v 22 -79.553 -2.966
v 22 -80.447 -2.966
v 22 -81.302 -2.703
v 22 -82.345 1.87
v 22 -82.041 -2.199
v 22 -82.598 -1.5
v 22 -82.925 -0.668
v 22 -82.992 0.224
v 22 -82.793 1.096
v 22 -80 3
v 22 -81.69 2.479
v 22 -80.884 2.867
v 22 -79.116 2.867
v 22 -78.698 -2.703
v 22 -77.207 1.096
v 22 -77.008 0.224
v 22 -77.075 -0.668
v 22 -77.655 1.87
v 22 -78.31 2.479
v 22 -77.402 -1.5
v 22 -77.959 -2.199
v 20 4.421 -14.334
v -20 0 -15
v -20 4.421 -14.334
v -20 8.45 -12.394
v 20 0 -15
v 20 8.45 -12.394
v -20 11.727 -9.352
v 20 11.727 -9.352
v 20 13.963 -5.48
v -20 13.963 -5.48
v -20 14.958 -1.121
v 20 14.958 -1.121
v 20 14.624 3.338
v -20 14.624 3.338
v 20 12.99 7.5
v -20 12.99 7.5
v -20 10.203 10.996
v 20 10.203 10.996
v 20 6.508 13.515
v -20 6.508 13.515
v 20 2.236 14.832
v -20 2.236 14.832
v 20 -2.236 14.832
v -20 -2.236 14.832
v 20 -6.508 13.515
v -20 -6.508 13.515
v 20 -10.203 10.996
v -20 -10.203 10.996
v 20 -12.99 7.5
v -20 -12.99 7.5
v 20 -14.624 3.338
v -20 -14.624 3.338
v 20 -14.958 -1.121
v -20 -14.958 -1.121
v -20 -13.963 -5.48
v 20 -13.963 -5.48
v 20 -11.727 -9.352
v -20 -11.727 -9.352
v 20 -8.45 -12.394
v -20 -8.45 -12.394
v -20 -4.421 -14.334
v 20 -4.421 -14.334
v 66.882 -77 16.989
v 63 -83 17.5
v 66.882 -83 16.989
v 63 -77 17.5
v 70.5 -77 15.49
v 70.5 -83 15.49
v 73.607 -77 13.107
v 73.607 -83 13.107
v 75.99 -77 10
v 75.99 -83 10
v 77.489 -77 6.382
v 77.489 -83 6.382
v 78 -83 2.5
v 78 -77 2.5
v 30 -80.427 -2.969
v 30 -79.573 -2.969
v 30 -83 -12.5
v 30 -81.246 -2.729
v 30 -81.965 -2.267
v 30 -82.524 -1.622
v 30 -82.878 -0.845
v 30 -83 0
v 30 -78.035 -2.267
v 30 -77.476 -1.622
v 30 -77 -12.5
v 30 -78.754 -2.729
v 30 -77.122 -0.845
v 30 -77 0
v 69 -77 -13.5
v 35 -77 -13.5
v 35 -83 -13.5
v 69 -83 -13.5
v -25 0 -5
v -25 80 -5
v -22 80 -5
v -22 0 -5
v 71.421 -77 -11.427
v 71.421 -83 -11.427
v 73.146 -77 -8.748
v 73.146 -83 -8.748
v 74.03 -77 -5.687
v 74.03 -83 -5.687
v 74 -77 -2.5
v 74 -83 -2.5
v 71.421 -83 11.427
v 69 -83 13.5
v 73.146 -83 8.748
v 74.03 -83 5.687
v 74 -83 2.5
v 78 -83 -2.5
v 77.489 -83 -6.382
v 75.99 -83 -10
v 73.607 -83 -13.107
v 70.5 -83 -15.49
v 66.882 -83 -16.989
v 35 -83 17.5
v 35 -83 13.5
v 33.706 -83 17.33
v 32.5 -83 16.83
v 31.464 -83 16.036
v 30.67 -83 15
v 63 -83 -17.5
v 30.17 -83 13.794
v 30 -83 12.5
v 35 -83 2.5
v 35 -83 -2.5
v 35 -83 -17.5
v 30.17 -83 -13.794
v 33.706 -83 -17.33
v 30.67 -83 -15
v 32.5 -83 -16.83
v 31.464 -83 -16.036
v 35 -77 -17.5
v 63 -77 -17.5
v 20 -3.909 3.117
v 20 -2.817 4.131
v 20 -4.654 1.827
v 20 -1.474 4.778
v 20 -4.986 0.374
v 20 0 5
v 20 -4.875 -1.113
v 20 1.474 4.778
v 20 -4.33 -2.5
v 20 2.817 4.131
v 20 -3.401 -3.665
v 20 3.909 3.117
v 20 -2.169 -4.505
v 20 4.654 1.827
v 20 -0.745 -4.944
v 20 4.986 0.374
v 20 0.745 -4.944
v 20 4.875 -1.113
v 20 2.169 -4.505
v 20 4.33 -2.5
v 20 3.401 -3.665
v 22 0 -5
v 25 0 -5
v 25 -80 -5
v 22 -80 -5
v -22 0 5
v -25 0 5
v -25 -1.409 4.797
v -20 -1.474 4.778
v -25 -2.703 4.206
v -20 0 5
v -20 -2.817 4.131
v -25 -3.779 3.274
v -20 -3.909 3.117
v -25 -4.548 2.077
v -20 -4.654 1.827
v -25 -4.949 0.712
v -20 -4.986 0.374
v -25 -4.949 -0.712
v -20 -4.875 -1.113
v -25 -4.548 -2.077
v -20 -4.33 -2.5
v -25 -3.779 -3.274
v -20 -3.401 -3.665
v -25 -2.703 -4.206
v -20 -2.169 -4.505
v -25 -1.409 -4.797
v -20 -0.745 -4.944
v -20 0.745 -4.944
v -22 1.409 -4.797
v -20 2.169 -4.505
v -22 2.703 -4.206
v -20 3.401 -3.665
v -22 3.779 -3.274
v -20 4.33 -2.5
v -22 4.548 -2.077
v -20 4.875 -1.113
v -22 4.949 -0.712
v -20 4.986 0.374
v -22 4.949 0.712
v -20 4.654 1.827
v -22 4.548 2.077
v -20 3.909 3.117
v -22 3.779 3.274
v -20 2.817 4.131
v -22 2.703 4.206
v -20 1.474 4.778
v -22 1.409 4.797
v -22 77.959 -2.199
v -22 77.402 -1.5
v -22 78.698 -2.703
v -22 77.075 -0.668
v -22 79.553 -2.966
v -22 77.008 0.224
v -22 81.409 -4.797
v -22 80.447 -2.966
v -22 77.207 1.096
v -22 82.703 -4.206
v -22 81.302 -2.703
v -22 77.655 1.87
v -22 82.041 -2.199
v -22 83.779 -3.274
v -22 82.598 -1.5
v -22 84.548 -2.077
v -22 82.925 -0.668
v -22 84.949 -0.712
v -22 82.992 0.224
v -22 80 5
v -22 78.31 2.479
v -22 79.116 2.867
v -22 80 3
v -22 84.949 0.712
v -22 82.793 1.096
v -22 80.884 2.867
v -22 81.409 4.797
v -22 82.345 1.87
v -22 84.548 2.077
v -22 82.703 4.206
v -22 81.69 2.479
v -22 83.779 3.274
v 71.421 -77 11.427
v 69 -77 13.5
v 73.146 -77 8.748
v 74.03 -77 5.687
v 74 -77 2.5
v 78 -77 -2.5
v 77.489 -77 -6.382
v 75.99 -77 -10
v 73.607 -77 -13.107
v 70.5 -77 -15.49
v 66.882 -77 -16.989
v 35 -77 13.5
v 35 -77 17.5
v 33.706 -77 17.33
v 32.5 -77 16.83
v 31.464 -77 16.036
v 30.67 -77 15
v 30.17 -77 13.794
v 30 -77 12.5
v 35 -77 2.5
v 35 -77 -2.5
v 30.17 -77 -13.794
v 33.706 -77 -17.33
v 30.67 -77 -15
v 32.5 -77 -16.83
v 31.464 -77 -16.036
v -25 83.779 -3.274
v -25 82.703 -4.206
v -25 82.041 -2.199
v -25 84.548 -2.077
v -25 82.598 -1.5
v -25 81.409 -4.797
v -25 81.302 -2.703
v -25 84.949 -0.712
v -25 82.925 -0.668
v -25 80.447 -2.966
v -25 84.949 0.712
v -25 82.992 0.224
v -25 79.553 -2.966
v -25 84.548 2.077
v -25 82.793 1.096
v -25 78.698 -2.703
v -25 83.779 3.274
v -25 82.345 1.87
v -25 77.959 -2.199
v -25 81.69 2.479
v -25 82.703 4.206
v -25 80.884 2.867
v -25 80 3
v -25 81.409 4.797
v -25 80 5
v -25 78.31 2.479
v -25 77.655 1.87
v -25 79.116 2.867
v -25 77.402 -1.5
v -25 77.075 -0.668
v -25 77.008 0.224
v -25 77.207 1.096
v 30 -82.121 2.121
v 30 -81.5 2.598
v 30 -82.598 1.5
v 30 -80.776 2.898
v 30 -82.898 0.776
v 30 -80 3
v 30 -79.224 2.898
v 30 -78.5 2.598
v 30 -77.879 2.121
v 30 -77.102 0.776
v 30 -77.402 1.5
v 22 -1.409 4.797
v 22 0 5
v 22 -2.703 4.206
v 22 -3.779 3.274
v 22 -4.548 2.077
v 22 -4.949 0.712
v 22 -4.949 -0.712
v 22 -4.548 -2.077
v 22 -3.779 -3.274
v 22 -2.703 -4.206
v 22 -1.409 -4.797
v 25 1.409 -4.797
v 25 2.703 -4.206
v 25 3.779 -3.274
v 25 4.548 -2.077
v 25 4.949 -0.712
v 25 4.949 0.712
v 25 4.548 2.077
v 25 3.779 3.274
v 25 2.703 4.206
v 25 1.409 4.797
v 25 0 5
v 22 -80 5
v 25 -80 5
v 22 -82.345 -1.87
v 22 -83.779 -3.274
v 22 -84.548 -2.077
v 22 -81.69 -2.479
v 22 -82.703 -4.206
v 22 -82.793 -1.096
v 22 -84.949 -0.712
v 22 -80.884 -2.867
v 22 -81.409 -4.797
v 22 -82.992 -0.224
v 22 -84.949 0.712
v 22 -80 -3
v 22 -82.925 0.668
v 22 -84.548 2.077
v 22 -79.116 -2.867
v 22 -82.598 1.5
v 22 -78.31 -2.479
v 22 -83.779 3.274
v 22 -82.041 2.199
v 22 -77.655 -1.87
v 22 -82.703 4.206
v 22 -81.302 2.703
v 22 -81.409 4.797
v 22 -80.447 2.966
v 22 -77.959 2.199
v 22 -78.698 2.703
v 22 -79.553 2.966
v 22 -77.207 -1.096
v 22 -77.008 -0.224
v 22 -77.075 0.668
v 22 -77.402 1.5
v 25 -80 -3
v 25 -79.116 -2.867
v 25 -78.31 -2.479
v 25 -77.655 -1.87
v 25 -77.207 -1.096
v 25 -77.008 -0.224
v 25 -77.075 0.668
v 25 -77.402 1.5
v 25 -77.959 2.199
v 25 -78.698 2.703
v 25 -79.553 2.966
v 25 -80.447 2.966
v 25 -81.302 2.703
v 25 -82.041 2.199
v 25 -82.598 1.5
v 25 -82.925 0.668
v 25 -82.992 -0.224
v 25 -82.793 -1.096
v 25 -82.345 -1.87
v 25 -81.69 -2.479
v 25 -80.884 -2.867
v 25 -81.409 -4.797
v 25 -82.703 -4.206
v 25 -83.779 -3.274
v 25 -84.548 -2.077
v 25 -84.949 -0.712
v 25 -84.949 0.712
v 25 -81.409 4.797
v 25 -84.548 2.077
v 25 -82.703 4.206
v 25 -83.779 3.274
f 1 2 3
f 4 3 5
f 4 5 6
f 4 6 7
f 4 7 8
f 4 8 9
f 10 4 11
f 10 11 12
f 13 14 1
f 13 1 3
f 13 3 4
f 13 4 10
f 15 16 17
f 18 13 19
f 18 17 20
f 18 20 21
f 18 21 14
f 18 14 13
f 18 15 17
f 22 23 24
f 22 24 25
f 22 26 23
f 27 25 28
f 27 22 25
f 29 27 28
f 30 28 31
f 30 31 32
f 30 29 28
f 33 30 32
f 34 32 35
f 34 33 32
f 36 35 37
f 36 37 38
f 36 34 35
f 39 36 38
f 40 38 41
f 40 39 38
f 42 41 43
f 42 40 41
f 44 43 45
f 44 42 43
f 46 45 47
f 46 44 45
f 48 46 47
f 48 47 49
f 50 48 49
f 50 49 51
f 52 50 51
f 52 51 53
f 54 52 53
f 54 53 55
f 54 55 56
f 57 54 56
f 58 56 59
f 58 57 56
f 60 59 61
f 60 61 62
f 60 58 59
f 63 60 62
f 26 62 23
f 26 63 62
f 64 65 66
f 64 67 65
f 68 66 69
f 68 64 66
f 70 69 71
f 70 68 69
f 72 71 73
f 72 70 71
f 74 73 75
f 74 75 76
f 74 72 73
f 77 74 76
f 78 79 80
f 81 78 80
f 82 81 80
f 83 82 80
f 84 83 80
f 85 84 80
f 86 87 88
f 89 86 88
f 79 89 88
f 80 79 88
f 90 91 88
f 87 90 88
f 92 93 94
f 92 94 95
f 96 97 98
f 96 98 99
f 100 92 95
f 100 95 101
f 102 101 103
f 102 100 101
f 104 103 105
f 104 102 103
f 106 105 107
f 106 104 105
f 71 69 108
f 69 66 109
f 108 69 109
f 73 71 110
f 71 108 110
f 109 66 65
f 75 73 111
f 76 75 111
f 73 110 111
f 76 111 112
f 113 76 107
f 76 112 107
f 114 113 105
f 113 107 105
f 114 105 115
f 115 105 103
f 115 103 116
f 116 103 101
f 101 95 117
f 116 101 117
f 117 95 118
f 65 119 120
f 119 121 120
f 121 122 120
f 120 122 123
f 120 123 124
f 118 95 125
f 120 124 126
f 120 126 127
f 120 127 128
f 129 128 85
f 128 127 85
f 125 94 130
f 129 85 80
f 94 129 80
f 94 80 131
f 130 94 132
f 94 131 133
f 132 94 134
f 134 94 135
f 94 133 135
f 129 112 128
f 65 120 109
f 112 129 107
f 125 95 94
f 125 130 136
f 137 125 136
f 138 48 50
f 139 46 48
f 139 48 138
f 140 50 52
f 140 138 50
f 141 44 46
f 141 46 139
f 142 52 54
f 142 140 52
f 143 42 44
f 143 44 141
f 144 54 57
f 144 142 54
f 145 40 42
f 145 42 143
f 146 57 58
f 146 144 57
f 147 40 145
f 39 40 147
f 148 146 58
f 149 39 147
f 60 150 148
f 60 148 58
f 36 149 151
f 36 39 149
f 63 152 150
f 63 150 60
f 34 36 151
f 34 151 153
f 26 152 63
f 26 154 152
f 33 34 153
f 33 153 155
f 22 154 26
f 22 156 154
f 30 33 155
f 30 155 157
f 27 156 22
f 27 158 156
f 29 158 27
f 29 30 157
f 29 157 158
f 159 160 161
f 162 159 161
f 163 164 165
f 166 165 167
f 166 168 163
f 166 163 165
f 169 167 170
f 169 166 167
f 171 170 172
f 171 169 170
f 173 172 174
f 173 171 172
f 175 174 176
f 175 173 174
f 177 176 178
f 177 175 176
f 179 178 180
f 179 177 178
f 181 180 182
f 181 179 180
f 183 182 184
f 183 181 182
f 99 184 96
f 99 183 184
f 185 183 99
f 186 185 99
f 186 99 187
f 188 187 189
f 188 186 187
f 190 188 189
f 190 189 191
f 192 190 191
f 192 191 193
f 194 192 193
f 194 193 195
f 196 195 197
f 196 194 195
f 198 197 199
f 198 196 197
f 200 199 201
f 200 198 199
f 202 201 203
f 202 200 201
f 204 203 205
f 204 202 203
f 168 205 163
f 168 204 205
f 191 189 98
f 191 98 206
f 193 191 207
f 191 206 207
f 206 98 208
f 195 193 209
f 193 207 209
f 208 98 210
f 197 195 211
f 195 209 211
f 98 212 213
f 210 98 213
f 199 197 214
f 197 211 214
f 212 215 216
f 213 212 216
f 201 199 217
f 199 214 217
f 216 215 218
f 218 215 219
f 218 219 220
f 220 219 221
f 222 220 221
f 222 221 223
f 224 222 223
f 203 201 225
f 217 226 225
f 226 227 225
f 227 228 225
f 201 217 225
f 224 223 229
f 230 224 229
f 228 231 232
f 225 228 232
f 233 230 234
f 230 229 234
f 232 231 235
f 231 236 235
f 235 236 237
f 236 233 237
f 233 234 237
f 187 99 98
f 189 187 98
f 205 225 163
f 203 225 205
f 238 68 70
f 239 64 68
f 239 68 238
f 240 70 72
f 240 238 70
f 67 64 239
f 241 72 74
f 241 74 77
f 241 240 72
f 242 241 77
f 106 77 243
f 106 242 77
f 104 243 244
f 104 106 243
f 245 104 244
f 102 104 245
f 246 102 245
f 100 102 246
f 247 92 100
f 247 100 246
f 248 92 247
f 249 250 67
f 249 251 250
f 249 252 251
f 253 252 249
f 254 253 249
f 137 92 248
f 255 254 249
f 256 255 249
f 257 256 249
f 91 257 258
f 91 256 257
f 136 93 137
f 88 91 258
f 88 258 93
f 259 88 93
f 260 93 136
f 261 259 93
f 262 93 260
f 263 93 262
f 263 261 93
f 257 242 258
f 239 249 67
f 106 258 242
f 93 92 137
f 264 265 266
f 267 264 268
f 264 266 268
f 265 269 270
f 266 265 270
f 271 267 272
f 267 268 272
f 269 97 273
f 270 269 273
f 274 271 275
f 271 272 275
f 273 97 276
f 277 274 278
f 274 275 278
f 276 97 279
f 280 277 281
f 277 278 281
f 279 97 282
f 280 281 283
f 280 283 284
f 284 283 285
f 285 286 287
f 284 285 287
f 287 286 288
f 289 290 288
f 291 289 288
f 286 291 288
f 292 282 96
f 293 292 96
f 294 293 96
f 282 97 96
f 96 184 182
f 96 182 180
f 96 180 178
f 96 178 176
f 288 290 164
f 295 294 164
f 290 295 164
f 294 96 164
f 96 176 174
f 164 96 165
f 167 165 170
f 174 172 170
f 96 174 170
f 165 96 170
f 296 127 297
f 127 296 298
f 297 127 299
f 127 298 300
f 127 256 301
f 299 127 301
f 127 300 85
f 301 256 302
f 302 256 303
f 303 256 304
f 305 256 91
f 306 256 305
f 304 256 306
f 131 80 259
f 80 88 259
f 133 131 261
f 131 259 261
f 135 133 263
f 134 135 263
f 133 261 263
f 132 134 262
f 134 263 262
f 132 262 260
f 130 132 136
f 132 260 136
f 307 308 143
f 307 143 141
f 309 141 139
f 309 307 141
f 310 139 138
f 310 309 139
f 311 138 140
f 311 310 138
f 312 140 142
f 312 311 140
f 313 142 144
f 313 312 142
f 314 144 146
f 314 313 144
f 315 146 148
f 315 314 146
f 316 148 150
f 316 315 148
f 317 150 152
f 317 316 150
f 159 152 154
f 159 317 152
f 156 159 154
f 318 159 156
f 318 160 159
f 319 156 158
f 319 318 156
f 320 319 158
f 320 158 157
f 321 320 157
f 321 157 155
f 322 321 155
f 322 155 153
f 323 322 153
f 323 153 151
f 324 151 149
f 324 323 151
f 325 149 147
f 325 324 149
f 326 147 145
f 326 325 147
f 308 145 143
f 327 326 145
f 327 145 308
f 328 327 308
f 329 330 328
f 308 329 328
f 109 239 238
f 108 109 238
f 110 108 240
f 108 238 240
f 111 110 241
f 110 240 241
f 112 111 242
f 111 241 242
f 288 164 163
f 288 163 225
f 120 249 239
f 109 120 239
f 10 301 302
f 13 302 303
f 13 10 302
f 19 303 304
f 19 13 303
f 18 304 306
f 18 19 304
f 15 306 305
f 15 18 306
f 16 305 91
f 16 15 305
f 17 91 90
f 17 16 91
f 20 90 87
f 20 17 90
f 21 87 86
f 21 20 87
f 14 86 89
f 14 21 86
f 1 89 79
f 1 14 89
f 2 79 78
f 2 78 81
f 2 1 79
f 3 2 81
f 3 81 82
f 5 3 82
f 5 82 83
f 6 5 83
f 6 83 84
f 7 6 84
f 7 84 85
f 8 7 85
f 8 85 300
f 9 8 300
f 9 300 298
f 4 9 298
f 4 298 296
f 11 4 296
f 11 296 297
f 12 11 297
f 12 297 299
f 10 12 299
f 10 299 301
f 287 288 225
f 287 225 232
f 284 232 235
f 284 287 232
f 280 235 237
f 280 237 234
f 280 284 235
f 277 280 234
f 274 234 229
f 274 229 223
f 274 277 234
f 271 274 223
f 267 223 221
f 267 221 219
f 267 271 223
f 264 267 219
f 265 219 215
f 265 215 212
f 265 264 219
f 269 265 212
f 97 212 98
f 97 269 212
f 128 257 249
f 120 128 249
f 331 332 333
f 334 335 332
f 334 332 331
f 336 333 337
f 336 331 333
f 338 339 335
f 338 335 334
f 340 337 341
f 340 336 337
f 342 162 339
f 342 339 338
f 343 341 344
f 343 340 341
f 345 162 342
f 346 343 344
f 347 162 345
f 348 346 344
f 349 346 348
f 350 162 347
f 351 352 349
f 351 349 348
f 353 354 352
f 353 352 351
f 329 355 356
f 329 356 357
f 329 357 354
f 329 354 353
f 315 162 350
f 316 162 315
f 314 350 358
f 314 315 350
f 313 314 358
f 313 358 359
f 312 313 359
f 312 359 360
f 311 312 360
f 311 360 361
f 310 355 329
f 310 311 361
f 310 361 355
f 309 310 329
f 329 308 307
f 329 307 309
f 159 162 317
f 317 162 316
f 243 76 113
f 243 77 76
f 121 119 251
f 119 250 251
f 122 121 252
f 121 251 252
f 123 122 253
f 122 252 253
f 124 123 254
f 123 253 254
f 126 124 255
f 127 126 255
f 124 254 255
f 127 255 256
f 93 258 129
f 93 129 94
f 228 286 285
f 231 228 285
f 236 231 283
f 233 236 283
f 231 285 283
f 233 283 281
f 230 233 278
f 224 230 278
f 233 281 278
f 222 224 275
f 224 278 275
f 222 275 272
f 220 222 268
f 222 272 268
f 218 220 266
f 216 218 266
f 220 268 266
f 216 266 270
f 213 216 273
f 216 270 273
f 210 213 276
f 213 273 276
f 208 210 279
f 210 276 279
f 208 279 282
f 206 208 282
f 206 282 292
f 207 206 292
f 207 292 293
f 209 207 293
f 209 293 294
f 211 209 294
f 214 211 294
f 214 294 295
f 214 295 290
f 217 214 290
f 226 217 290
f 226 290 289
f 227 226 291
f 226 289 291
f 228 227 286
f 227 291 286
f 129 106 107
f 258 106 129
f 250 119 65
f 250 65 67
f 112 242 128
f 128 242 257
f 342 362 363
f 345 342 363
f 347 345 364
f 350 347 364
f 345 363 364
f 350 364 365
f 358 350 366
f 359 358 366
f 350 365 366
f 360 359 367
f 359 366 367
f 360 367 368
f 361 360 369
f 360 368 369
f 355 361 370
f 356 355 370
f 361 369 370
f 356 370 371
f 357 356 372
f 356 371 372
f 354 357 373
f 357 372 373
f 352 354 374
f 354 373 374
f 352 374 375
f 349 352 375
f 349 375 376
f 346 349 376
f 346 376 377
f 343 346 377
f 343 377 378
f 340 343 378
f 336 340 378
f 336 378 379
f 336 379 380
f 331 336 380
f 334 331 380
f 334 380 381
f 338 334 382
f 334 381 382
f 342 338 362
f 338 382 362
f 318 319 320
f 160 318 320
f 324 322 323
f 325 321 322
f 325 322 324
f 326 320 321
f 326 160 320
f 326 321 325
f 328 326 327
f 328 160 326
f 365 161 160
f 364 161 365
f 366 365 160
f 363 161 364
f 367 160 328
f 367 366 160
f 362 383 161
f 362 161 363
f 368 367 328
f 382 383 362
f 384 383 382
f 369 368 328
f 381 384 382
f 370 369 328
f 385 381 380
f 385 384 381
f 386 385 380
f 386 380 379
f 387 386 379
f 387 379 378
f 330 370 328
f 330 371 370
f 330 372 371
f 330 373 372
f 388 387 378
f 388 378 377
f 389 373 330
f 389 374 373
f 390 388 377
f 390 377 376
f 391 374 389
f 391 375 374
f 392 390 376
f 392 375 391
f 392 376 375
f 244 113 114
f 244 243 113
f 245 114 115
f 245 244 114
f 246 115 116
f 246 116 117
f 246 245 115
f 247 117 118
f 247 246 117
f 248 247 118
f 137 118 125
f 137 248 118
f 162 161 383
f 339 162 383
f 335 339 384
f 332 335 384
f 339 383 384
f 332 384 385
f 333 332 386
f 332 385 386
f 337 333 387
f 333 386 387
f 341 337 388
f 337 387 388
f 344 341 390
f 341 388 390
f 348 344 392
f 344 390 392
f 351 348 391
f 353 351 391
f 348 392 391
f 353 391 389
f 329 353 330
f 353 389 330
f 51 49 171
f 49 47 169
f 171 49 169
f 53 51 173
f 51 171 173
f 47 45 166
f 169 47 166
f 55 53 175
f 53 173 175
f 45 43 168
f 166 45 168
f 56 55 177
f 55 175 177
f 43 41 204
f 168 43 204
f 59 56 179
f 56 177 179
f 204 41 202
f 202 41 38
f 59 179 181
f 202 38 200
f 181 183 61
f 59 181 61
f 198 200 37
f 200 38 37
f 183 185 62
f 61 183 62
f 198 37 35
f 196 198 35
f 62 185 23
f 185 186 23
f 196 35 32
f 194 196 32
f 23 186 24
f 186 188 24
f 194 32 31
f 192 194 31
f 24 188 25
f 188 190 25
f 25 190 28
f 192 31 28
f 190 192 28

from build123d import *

# Parameters (mm, degrees)
SKETCH1_R           = 15
BOSS_EXTRUDE1_DEPTH = 20
SKETCH2_R           = 5
BOSS_EXTRUDE2_DEPTH = 25
SKETCH3_R           = 3
BOSS_EXTRUDE3_DEPTH = 3
SKETCH4_R           = 3
BOSS_EXTRUDE4_DEPTH = 3
SKETCH5_R           = 3
BOSS_EXTRUDE5_DEPTH = 8
SKETCH6_W           = 35
SKETCH6_H           = 6
BOSS_EXTRUDE6_DEPTH = 48
FILLET1_R           = 15
FILLET2_R           = 5
CUT_EXTRUDE1_DEPTH  = 48


with BuildPart() as part:
    # Sketch1 → Boss-Extrude1 (new, symmetric)
    with BuildSketch(Plane(origin=(0, 0, 0), x_dir=(0, 0, -1), z_dir=(1, 0, 0))):
        Circle(SKETCH1_R)
    extrude(amount=BOSS_EXTRUDE1_DEPTH, both=True)

    # Sketch2 → Boss-Extrude2 (add, symmetric)
    with BuildSketch(Plane(origin=(0, 0, 0), x_dir=(0, 0, -1), z_dir=(1, 0, 0))):
        with Locations(Location((0, 0, 0), (0, 0, 180))):
            Circle(SKETCH2_R)
    extrude(amount=BOSS_EXTRUDE2_DEPTH, both=True)

    # Sketch3 → Boss-Extrude3 (add)
    with BuildSketch(Plane(origin=(25, 0, 0), x_dir=(0, 0, -1), z_dir=(1, 0, 0))):
        with BuildLine():
            Line((-5, 0), (5, 0))
            Line((5, 0), (5, -80))
            ThreePointArc((5, -80), (0, -85), (-5, -80))
            Line((-5, -80), (-5, 0))
        make_face()
        with Locations((0, -80)):
            Circle(SKETCH3_R, mode=Mode.SUBTRACT)
    extrude(amount=-BOSS_EXTRUDE3_DEPTH)

    # Sketch4 → Boss-Extrude4 (add)
    with BuildSketch(Plane.ZY.offset(25)):
        with BuildLine():
            Line((-5, 0), (5, 0))
            Line((5, 0), (5, 80))
            ThreePointArc((5, 80), (-3.35e-07, 85), (-5, 79.99999933))
            Line((-5, 79.99999933), (-5, 0))
        make_face()
        with Locations((0, 80)):
            Circle(SKETCH4_R, mode=Mode.SUBTRACT)
    extrude(amount=-BOSS_EXTRUDE4_DEPTH)


with BuildPart() as body_2:
    # Sketch5 → Boss-Extrude5 (new body)
    with BuildSketch(Plane.ZY.offset(-22)):
        with Locations((0, -80)):
            Circle(SKETCH5_R)
    extrude(amount=-BOSS_EXTRUDE5_DEPTH)

    # Sketch6 → Boss-Extrude6 (add)
    with BuildSketch(Plane(origin=(30, 0, 0), x_dir=(0, 0, -1), z_dir=(1, 0, 0))):
        with Locations((0, -80)):
            Rectangle(SKETCH6_W, SKETCH6_H)
    extrude(amount=BOSS_EXTRUDE6_DEPTH)

    # Fillet1
    fillet1_edges = [body_2.edges().sort_by_distance(p)[0] for p in [
        (78, -80, 17.5),
        (78, -80, -17.5),
    ]]
    fillet(fillet1_edges, radius=FILLET1_R)

    # Fillet2
    fillet2_edges = [body_2.edges().sort_by_distance(p)[0] for p in [
        (30, -80, 17.5),
        (30, -80, -17.5),
    ]]
    fillet(fillet2_edges, radius=FILLET2_R)

    # Sketch7 → Cut-Extrude1 (cut)
    with BuildSketch(Plane(origin=(0, -77, 0), x_dir=(1, 0, 0), z_dir=(0, 1, 0))):
        with BuildLine():
            Line((74, 2.5), (35, 2.5))
            Line((35, 2.5), (35, 13.5))
            Line((35, 13.5), (69, 13.5))
            ThreePointArc((69, 13.5), (73.145589228, 8.747995103), (74, 2.5))
        make_face()
        with BuildLine():
            Line((74, -2.5), (35, -2.5))
            Line((35, -2.5), (35, -13.5))
            Line((35, -13.5), (69, -13.5))
            ThreePointArc((69, -13.5), (73.145589228, -8.747995103), (74, -2.5))
        make_face()
    extrude(amount=-CUT_EXTRUDE1_DEPTH, mode=Mode.SUBTRACT)


solid = Compound([part.part, body_2.part])
